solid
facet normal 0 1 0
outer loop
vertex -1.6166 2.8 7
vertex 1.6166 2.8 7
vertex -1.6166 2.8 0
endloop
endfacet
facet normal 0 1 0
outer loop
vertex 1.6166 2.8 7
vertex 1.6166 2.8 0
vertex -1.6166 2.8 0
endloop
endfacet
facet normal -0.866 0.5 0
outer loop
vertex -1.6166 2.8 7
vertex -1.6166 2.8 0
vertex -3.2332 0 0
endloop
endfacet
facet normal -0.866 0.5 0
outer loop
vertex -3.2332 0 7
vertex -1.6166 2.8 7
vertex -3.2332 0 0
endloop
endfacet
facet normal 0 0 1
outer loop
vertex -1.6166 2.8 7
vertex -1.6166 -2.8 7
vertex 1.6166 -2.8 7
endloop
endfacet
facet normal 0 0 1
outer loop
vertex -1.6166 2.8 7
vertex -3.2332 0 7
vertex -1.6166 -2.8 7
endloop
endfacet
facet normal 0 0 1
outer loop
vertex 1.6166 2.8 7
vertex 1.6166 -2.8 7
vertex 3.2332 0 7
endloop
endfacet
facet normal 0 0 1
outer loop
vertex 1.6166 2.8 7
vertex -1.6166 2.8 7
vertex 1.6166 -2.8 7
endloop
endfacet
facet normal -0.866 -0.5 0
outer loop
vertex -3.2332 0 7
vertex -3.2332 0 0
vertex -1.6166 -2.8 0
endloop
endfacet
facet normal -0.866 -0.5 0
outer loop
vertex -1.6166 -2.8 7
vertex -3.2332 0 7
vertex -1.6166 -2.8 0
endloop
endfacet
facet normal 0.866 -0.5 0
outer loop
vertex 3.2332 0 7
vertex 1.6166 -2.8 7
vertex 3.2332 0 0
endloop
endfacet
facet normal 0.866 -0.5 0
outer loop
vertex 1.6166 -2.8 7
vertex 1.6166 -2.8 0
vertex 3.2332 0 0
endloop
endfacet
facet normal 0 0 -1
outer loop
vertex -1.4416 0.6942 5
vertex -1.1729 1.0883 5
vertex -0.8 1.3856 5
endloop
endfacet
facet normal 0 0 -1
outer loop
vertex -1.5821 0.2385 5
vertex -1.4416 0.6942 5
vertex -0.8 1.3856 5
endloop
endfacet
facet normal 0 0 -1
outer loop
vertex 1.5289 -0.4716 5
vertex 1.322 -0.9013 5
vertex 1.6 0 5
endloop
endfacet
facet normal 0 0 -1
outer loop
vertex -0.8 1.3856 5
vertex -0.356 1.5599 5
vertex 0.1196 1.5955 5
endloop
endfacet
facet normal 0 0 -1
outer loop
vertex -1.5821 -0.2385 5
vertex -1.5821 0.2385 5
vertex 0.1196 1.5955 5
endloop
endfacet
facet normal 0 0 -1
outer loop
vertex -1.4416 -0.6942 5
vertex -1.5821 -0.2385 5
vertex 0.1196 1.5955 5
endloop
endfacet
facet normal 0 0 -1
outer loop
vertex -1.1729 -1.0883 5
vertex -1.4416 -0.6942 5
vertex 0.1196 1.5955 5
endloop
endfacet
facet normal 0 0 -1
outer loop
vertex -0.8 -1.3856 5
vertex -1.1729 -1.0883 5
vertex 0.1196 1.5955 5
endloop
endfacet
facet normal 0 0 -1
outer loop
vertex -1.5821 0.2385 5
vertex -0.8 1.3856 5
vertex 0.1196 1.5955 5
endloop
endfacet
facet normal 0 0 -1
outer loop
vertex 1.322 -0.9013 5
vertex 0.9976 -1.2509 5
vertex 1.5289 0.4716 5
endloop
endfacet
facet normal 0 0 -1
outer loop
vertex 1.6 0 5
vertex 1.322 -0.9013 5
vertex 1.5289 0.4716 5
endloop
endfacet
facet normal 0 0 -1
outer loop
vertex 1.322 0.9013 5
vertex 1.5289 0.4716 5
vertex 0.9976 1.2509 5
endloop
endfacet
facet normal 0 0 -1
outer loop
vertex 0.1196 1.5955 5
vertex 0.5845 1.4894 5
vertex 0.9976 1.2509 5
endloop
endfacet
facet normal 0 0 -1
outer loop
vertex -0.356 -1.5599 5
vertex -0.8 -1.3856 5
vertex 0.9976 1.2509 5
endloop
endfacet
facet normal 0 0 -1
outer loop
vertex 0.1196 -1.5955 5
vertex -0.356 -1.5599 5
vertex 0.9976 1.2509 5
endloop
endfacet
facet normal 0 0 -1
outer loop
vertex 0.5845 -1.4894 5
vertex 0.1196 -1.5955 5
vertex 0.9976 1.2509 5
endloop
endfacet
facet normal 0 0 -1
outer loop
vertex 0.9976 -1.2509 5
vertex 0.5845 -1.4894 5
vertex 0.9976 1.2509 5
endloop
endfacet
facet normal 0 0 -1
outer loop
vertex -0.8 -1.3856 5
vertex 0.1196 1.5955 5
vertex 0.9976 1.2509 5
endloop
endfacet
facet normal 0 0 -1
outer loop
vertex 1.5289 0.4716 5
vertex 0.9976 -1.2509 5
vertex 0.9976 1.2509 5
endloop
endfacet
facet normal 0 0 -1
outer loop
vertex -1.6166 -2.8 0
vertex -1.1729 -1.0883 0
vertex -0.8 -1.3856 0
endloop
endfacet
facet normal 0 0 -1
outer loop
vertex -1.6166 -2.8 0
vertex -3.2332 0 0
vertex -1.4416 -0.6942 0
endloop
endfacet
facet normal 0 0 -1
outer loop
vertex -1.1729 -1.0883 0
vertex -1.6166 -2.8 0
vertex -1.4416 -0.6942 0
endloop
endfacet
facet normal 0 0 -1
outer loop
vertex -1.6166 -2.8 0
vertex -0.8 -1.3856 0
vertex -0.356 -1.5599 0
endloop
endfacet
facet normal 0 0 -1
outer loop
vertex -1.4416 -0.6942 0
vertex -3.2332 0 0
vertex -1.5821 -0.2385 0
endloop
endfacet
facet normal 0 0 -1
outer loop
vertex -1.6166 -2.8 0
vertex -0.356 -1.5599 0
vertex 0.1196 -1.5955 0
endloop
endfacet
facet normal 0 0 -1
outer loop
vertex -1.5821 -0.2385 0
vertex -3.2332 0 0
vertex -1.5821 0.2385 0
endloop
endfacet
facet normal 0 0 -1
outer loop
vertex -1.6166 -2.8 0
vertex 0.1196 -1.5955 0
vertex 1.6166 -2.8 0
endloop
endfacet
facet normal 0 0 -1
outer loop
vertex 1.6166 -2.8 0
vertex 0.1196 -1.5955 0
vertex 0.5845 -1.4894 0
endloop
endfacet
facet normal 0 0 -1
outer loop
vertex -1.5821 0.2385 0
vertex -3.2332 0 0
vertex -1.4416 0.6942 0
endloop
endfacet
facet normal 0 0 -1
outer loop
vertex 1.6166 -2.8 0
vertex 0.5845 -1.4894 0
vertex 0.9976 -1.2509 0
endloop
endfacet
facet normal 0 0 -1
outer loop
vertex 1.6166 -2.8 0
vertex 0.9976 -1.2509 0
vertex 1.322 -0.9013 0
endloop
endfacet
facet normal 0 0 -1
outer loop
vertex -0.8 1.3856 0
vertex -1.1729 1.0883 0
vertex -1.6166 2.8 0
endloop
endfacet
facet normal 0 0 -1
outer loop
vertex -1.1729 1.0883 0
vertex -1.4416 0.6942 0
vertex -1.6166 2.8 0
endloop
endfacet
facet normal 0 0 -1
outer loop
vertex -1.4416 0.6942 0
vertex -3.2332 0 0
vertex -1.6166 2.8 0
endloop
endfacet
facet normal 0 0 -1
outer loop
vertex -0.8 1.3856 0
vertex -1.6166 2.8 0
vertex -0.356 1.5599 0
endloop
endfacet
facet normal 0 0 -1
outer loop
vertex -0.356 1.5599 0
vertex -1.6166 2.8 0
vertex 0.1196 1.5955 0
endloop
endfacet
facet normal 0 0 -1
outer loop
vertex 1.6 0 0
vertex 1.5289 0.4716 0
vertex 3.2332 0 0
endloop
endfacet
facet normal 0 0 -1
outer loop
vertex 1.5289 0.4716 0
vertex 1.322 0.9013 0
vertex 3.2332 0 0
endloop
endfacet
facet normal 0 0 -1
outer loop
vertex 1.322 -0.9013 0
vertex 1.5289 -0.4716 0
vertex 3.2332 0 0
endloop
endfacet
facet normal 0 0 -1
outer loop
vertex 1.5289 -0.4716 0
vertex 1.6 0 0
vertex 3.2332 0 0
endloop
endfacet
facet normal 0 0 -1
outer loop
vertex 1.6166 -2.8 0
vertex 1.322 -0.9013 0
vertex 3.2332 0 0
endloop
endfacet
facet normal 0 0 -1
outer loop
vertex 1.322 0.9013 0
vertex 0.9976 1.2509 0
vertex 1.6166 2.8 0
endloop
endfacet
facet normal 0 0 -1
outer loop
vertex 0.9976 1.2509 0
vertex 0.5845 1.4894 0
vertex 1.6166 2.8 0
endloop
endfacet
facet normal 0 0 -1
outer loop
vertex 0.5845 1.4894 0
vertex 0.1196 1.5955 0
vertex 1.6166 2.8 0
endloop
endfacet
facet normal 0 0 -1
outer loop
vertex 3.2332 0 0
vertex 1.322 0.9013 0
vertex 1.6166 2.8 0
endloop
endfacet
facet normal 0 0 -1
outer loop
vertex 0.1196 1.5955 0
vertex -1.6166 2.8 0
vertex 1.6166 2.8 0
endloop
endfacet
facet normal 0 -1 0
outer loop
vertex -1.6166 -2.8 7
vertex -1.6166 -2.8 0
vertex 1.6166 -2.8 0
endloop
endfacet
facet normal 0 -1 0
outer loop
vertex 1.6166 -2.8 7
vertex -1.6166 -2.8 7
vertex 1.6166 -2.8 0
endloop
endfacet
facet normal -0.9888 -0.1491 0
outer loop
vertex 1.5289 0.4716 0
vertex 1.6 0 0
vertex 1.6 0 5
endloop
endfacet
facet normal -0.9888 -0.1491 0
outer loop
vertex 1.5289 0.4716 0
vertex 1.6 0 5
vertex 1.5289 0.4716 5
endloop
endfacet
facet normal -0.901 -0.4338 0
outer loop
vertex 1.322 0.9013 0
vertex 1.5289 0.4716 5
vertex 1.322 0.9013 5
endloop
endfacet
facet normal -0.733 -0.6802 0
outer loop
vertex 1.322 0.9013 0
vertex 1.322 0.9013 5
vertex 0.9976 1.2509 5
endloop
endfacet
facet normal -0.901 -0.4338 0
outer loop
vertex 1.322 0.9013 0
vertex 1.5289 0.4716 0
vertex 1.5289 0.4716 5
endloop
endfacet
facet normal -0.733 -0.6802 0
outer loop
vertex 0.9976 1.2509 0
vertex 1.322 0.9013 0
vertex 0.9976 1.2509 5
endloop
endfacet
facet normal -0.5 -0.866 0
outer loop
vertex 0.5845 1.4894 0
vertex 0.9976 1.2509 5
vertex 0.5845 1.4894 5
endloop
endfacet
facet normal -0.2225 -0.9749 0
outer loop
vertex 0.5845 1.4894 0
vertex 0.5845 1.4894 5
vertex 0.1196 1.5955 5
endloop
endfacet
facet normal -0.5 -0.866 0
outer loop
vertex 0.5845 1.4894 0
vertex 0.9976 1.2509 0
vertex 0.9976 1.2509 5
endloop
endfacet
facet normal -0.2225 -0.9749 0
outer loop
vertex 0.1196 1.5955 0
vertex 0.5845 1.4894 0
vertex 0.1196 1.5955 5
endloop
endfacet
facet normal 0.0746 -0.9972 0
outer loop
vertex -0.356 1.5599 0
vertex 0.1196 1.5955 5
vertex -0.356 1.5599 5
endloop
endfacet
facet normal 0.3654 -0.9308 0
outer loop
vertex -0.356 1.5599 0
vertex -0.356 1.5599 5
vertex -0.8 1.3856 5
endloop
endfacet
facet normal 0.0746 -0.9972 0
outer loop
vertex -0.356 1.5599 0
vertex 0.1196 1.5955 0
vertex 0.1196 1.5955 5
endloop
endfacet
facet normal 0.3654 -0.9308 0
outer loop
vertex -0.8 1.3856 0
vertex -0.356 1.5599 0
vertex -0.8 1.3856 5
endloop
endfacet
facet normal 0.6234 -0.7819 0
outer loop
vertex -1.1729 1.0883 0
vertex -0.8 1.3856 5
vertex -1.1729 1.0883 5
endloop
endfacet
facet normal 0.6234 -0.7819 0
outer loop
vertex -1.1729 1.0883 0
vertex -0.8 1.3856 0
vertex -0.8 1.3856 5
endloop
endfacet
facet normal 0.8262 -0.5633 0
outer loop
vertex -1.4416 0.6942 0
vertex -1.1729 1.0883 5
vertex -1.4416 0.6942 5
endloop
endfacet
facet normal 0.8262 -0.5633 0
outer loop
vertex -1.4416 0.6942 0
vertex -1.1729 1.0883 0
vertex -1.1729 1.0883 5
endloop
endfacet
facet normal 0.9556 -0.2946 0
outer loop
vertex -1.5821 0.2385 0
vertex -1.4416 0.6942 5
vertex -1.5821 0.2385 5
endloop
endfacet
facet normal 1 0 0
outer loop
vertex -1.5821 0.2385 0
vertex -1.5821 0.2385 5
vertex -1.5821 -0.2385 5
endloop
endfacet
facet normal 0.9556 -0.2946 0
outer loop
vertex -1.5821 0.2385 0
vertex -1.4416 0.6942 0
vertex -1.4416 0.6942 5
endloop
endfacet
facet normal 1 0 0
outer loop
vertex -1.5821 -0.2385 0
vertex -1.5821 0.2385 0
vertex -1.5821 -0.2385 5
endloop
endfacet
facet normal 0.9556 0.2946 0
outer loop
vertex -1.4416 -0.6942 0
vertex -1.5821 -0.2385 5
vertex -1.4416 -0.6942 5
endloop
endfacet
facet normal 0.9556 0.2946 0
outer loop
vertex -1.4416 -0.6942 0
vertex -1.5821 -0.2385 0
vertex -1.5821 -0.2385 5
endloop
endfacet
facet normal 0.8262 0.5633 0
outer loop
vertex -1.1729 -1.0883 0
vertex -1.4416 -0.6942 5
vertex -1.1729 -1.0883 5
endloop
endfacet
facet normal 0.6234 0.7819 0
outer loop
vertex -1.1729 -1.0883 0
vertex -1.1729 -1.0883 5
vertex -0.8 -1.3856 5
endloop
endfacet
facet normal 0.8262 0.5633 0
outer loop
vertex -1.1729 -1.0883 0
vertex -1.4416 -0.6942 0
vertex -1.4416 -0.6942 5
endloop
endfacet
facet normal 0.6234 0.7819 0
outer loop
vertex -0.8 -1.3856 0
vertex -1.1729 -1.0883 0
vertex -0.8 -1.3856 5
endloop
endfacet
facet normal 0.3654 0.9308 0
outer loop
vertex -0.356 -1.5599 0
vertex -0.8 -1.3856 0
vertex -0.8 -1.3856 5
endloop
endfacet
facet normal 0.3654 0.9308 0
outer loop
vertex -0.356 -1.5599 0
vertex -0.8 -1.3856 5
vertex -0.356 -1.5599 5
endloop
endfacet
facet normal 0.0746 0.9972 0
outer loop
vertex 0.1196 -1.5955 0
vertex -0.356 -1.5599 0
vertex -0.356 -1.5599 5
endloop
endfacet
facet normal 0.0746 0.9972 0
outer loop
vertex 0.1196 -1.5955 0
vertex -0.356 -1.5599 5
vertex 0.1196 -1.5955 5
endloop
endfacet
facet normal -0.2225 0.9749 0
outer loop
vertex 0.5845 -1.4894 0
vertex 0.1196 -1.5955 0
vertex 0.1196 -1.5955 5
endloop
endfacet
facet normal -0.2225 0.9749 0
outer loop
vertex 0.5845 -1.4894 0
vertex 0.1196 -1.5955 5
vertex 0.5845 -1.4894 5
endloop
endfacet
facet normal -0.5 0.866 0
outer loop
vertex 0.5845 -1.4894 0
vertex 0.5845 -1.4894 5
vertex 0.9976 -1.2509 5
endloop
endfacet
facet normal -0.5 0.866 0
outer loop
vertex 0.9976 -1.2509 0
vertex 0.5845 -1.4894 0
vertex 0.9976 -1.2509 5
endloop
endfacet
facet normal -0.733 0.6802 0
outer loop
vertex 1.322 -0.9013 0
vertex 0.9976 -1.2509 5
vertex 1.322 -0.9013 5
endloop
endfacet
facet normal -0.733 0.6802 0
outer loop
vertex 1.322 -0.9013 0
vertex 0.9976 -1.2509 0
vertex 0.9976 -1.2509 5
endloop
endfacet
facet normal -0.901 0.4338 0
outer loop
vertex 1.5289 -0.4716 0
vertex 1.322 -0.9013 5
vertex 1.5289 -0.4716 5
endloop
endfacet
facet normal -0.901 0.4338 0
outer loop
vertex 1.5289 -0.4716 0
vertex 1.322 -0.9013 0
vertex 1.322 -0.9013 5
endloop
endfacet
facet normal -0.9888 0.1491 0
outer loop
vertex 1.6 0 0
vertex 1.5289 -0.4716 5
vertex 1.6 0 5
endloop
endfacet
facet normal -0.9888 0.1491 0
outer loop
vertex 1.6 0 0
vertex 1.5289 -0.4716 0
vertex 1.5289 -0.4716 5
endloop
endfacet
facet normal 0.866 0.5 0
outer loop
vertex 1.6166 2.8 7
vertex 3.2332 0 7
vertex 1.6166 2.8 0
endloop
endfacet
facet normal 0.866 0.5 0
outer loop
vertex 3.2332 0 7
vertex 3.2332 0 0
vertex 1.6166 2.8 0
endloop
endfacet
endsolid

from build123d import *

# Parameters (mm, degrees)
F2_R     = 1.6
F3_DEPTH = 5
F4_R     = 1.6
F5_DEPTH = 2


with BuildPart() as f3:
    # F2 (on Top) → F3 (new body)
    with BuildSketch(Plane.XY):
        Polygon((-1.6165807537, -2.8), (1.6165807537, -2.8), (3.2331615075, 0), (1.6165807537, 2.8), (-1.6165807537, 2.8), (-3.2331615075, 0), align=None)
        Circle(F2_R, mode=Mode.SUBTRACT)
    extrude(amount=F3_DEPTH)

    # F4 (on face) → F5 (join)
    with BuildSketch(Plane.XY.offset(5)):
        Polygon((-1.6165807537, -2.8), (1.6165807537, -2.8), (3.2331615075, 0), (1.6165807537, 2.8), (-1.6165807537, 2.8), (-3.2331615075, 0), align=None)
        Circle(F4_R, mode=Mode.SUBTRACT)
        Circle(F4_R)
    extrude(amount=F5_DEPTH)


solid = f3.part
